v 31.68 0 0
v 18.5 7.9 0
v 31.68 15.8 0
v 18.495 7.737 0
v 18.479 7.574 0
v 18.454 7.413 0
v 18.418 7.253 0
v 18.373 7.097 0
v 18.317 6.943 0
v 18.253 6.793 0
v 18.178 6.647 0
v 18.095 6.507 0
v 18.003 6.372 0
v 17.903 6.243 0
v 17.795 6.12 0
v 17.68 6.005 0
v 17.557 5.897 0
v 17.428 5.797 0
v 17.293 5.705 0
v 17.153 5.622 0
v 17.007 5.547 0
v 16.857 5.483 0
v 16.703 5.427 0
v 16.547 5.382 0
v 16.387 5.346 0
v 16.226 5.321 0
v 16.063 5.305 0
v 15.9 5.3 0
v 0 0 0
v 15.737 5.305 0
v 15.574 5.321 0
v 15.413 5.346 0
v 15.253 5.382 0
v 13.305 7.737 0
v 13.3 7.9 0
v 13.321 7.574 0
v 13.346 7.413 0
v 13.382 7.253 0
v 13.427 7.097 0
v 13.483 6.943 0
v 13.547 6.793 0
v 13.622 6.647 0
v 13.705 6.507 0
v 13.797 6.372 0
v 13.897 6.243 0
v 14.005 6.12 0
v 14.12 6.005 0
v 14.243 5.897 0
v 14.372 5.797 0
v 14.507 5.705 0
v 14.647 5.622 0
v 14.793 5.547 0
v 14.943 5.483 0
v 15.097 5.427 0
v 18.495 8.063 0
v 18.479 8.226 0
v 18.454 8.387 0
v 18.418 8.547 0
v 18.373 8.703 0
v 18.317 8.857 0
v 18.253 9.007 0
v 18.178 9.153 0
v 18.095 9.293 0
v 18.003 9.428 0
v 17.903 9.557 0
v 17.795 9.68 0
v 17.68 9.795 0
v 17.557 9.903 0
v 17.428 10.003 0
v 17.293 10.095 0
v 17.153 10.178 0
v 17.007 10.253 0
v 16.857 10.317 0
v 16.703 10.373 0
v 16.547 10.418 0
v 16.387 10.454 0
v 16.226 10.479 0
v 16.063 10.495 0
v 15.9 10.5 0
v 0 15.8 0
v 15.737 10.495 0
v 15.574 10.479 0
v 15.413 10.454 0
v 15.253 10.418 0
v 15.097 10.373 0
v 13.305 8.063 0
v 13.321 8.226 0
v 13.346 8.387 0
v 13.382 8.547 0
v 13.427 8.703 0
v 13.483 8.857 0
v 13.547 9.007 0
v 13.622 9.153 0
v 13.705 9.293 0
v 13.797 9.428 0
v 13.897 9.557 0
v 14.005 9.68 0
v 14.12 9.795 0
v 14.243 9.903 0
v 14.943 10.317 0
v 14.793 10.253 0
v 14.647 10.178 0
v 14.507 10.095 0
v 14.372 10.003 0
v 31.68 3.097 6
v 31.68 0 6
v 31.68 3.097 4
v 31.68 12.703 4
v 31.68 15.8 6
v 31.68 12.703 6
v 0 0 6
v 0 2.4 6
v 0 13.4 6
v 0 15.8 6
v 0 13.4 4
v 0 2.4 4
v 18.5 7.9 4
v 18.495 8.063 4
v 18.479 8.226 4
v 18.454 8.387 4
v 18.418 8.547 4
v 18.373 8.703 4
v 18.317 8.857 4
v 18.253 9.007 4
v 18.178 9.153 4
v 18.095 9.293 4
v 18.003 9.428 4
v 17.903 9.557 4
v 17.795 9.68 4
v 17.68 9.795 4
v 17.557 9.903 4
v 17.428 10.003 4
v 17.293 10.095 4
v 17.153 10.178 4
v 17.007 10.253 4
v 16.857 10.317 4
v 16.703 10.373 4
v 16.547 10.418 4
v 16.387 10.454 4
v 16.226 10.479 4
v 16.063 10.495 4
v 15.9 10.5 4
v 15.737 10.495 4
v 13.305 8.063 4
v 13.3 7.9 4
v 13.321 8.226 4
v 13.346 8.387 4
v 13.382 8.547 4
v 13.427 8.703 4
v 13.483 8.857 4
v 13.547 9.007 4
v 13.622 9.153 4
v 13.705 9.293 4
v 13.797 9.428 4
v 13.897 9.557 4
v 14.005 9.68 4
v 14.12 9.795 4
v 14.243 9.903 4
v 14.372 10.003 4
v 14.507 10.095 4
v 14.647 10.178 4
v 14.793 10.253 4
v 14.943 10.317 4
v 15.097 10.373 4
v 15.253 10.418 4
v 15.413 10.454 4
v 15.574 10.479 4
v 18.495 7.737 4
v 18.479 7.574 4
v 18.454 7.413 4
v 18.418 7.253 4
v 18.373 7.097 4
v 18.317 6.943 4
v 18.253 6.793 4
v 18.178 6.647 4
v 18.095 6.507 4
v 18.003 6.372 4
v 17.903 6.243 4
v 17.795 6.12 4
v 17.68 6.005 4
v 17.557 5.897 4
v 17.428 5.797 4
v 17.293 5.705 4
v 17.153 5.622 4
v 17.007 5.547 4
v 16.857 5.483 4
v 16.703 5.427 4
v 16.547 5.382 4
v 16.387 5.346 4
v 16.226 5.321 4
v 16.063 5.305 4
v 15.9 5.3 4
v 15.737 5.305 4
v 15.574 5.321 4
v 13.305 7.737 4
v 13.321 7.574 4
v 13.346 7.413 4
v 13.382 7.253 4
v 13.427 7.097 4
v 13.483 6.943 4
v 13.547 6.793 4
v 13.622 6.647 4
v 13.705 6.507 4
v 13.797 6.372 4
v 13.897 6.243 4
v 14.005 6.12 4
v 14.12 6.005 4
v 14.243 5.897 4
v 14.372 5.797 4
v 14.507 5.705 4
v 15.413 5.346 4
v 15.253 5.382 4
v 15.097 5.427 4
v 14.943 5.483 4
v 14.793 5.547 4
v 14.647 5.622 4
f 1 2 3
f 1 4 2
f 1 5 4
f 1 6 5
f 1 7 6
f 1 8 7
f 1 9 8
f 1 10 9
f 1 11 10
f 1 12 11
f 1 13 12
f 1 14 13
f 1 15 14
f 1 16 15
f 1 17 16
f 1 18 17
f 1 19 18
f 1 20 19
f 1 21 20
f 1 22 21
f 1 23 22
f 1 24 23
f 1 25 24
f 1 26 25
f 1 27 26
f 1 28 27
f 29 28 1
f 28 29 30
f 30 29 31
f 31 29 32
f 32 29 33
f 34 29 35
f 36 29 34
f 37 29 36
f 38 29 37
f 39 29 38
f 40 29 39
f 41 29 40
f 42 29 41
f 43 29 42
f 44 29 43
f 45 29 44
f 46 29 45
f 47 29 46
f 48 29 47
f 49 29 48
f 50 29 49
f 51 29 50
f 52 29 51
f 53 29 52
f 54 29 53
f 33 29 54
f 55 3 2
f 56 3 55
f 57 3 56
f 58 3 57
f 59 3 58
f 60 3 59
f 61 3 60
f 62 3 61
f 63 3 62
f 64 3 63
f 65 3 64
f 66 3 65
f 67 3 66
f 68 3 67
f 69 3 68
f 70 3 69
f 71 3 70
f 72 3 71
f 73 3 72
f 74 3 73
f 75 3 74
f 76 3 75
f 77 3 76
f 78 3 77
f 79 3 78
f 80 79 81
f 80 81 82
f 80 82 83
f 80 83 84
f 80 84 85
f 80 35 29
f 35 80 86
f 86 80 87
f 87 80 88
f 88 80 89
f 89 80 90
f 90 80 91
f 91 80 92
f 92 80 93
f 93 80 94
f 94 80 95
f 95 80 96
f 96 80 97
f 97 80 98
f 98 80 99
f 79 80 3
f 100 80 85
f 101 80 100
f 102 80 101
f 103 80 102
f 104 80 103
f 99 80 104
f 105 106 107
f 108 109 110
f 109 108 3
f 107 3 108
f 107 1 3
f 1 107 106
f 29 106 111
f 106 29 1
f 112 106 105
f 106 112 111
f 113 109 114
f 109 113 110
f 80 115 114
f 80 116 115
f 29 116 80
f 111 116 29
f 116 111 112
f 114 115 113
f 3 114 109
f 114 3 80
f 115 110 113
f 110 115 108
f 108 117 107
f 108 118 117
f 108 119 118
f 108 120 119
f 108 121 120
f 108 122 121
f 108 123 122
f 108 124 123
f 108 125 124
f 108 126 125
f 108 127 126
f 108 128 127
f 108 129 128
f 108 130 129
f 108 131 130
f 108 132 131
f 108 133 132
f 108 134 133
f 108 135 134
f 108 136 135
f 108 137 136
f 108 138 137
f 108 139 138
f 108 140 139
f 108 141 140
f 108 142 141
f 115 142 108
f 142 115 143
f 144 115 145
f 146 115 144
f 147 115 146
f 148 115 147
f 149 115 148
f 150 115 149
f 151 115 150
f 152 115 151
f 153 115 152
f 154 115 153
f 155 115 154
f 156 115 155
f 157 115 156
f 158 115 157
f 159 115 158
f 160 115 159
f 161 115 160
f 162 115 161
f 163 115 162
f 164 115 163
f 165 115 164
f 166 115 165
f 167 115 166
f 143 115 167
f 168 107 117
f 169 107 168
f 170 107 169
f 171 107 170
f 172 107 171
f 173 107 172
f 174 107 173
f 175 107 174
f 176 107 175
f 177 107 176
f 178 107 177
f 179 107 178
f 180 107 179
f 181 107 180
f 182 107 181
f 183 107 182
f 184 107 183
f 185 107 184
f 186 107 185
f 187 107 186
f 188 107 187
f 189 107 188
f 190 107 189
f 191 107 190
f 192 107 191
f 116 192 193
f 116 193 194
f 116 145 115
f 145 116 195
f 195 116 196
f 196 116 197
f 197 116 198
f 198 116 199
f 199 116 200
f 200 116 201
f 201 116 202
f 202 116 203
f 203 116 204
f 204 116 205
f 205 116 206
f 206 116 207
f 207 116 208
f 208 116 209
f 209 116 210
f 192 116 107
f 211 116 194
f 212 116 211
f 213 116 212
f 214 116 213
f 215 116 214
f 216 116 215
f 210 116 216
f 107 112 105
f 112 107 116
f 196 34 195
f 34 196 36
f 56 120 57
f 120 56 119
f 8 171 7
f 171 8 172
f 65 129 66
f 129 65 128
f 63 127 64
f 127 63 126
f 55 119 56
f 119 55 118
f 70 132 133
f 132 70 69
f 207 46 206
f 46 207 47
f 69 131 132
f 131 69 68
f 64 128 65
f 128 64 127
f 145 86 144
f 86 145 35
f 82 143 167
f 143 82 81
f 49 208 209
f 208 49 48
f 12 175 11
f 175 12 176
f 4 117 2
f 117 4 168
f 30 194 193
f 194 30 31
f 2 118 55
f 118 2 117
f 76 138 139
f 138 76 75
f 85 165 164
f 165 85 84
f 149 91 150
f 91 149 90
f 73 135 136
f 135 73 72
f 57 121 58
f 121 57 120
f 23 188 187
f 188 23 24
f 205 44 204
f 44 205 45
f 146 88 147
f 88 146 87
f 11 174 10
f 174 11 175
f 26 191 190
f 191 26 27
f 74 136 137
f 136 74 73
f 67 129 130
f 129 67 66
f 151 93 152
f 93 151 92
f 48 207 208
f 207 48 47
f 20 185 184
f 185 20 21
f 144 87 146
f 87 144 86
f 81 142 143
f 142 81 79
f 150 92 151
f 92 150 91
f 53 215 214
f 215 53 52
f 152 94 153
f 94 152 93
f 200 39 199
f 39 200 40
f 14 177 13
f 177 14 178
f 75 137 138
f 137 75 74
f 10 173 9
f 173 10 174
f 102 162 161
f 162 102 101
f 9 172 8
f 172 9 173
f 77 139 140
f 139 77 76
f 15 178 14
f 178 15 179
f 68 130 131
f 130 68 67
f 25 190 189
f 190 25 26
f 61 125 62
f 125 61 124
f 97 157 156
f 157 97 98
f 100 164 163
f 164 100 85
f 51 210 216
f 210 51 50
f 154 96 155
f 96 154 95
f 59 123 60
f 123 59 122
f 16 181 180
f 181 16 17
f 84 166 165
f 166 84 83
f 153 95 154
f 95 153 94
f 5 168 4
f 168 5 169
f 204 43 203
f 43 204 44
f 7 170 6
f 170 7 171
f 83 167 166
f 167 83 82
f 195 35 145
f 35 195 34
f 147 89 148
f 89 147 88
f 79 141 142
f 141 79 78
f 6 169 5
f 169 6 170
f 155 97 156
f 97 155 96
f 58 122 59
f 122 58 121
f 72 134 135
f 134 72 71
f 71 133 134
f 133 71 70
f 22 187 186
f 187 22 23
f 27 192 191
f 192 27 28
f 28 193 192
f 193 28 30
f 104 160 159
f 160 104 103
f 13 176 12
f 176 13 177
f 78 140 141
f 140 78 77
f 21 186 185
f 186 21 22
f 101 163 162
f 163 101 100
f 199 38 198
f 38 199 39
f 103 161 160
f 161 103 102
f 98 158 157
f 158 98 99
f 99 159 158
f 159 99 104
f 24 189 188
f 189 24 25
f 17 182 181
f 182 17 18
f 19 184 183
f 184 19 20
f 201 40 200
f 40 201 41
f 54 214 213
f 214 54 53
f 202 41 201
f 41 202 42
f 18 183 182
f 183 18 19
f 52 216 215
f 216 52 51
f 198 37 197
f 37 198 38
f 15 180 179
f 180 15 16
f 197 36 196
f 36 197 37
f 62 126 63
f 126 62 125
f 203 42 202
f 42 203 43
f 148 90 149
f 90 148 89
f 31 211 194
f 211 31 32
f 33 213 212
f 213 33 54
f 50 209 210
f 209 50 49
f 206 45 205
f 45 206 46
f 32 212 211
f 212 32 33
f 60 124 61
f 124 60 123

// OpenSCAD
// file: blinds-refs.scad
wallh=44;
wallw=42;
cornerrad=2;

3dpcomp=0.12;
distfrombottom=wallh-10;
distfromleft=wallw-18;

//fan
fanhb=11.0;
fanhs=9.6;

//arms
armw=36;
armh=20;
armslotthick=3.0;
armslotdepth=2.0;

//adapters
adapterw=32 -0.2; // to slide in fully 
adapterh=16 -0.2 ; //for sliding easier



//wall1 
wall1_thick=8;


//wall2
wall2_thick=6.4;
servobigcircle=11.5+ 3dpcomp; 
servosmallcircle=5.8+ 3dpcomp;
polygonlefth=5.8+ 3dpcomp;
polygonrighth=6+ 3dpcomp;
polygonw=6;
servo9gw=22.8;
servomounth=4 ;		//height of the screw pad for servo
servomountsize=6; //mount is 6mm square
servomountax=distfromleft+servobigcircle/2 +1;
servomountay=distfrombottom - servomountsize/2;
servomountbx=servomountax - servo9gw -servomountsize -1 ;
servomountby=servomountay;

//wall3
wall3_thick=4;
wall3slotw=adapterw;
wall3sloth=adapterh+ 2+2;
wall3slotd=2;

//base-frame
baseextra=2; 			// edge of base more than the wall widths
base_thick=6;

gap1=30;
gap2=26 + 2; 				//v.2 made this gap 26 +2 for buffer i.e extra thick adapter 
slotw=wallw+3dpcomp+.08;
slot1=wall1_thick+3dpcomp;
slot2=wall2_thick+3dpcomp;
slot3=wall3_thick + 3dpcomp;
sloth=4;
framew=slotw+baseextra;
frameh=slot1+slot2+slot3+gap1+gap2+baseextra;
// main file
$fn=100;

include <blinds-refs.scad>;

thickness=6.0;
slotdepth=2.0;



x1=0;    	y1=(adapterh-fanhb)/2;

x2=adapterw;			y2=(adapterh-fanhs)/2;

x3=adapterw;			y3=y2+fanhs;

x4=0;			y4=y1+fanhb;
servoarmouter();

module servoarmouter () {

 difference () {

   linear_extrude( height=thickness)
   color ( "blue") 
   polygon( [ [0,0],[adapterw-3dpcomp,0],[adapterw-3dpcomp,adapterh],[0,adapterh] ] , [   [0,1,2,3] ]);
  
   color("red")
   translate([0,0,thickness-slotdepth]) 
   linear_extrude(height=slotdepth)	
   polygon( [ [x1,y1],[x2,y2],[x3,y3],[x4,y4] ] , [   [0,1,2,3] ]);

	color ("red")
	translate([adapterw/2,(adapterh)/2,0])
	linear_extrude(height=thickness-slotdepth)
	circle(d=5.2);

  }

}
